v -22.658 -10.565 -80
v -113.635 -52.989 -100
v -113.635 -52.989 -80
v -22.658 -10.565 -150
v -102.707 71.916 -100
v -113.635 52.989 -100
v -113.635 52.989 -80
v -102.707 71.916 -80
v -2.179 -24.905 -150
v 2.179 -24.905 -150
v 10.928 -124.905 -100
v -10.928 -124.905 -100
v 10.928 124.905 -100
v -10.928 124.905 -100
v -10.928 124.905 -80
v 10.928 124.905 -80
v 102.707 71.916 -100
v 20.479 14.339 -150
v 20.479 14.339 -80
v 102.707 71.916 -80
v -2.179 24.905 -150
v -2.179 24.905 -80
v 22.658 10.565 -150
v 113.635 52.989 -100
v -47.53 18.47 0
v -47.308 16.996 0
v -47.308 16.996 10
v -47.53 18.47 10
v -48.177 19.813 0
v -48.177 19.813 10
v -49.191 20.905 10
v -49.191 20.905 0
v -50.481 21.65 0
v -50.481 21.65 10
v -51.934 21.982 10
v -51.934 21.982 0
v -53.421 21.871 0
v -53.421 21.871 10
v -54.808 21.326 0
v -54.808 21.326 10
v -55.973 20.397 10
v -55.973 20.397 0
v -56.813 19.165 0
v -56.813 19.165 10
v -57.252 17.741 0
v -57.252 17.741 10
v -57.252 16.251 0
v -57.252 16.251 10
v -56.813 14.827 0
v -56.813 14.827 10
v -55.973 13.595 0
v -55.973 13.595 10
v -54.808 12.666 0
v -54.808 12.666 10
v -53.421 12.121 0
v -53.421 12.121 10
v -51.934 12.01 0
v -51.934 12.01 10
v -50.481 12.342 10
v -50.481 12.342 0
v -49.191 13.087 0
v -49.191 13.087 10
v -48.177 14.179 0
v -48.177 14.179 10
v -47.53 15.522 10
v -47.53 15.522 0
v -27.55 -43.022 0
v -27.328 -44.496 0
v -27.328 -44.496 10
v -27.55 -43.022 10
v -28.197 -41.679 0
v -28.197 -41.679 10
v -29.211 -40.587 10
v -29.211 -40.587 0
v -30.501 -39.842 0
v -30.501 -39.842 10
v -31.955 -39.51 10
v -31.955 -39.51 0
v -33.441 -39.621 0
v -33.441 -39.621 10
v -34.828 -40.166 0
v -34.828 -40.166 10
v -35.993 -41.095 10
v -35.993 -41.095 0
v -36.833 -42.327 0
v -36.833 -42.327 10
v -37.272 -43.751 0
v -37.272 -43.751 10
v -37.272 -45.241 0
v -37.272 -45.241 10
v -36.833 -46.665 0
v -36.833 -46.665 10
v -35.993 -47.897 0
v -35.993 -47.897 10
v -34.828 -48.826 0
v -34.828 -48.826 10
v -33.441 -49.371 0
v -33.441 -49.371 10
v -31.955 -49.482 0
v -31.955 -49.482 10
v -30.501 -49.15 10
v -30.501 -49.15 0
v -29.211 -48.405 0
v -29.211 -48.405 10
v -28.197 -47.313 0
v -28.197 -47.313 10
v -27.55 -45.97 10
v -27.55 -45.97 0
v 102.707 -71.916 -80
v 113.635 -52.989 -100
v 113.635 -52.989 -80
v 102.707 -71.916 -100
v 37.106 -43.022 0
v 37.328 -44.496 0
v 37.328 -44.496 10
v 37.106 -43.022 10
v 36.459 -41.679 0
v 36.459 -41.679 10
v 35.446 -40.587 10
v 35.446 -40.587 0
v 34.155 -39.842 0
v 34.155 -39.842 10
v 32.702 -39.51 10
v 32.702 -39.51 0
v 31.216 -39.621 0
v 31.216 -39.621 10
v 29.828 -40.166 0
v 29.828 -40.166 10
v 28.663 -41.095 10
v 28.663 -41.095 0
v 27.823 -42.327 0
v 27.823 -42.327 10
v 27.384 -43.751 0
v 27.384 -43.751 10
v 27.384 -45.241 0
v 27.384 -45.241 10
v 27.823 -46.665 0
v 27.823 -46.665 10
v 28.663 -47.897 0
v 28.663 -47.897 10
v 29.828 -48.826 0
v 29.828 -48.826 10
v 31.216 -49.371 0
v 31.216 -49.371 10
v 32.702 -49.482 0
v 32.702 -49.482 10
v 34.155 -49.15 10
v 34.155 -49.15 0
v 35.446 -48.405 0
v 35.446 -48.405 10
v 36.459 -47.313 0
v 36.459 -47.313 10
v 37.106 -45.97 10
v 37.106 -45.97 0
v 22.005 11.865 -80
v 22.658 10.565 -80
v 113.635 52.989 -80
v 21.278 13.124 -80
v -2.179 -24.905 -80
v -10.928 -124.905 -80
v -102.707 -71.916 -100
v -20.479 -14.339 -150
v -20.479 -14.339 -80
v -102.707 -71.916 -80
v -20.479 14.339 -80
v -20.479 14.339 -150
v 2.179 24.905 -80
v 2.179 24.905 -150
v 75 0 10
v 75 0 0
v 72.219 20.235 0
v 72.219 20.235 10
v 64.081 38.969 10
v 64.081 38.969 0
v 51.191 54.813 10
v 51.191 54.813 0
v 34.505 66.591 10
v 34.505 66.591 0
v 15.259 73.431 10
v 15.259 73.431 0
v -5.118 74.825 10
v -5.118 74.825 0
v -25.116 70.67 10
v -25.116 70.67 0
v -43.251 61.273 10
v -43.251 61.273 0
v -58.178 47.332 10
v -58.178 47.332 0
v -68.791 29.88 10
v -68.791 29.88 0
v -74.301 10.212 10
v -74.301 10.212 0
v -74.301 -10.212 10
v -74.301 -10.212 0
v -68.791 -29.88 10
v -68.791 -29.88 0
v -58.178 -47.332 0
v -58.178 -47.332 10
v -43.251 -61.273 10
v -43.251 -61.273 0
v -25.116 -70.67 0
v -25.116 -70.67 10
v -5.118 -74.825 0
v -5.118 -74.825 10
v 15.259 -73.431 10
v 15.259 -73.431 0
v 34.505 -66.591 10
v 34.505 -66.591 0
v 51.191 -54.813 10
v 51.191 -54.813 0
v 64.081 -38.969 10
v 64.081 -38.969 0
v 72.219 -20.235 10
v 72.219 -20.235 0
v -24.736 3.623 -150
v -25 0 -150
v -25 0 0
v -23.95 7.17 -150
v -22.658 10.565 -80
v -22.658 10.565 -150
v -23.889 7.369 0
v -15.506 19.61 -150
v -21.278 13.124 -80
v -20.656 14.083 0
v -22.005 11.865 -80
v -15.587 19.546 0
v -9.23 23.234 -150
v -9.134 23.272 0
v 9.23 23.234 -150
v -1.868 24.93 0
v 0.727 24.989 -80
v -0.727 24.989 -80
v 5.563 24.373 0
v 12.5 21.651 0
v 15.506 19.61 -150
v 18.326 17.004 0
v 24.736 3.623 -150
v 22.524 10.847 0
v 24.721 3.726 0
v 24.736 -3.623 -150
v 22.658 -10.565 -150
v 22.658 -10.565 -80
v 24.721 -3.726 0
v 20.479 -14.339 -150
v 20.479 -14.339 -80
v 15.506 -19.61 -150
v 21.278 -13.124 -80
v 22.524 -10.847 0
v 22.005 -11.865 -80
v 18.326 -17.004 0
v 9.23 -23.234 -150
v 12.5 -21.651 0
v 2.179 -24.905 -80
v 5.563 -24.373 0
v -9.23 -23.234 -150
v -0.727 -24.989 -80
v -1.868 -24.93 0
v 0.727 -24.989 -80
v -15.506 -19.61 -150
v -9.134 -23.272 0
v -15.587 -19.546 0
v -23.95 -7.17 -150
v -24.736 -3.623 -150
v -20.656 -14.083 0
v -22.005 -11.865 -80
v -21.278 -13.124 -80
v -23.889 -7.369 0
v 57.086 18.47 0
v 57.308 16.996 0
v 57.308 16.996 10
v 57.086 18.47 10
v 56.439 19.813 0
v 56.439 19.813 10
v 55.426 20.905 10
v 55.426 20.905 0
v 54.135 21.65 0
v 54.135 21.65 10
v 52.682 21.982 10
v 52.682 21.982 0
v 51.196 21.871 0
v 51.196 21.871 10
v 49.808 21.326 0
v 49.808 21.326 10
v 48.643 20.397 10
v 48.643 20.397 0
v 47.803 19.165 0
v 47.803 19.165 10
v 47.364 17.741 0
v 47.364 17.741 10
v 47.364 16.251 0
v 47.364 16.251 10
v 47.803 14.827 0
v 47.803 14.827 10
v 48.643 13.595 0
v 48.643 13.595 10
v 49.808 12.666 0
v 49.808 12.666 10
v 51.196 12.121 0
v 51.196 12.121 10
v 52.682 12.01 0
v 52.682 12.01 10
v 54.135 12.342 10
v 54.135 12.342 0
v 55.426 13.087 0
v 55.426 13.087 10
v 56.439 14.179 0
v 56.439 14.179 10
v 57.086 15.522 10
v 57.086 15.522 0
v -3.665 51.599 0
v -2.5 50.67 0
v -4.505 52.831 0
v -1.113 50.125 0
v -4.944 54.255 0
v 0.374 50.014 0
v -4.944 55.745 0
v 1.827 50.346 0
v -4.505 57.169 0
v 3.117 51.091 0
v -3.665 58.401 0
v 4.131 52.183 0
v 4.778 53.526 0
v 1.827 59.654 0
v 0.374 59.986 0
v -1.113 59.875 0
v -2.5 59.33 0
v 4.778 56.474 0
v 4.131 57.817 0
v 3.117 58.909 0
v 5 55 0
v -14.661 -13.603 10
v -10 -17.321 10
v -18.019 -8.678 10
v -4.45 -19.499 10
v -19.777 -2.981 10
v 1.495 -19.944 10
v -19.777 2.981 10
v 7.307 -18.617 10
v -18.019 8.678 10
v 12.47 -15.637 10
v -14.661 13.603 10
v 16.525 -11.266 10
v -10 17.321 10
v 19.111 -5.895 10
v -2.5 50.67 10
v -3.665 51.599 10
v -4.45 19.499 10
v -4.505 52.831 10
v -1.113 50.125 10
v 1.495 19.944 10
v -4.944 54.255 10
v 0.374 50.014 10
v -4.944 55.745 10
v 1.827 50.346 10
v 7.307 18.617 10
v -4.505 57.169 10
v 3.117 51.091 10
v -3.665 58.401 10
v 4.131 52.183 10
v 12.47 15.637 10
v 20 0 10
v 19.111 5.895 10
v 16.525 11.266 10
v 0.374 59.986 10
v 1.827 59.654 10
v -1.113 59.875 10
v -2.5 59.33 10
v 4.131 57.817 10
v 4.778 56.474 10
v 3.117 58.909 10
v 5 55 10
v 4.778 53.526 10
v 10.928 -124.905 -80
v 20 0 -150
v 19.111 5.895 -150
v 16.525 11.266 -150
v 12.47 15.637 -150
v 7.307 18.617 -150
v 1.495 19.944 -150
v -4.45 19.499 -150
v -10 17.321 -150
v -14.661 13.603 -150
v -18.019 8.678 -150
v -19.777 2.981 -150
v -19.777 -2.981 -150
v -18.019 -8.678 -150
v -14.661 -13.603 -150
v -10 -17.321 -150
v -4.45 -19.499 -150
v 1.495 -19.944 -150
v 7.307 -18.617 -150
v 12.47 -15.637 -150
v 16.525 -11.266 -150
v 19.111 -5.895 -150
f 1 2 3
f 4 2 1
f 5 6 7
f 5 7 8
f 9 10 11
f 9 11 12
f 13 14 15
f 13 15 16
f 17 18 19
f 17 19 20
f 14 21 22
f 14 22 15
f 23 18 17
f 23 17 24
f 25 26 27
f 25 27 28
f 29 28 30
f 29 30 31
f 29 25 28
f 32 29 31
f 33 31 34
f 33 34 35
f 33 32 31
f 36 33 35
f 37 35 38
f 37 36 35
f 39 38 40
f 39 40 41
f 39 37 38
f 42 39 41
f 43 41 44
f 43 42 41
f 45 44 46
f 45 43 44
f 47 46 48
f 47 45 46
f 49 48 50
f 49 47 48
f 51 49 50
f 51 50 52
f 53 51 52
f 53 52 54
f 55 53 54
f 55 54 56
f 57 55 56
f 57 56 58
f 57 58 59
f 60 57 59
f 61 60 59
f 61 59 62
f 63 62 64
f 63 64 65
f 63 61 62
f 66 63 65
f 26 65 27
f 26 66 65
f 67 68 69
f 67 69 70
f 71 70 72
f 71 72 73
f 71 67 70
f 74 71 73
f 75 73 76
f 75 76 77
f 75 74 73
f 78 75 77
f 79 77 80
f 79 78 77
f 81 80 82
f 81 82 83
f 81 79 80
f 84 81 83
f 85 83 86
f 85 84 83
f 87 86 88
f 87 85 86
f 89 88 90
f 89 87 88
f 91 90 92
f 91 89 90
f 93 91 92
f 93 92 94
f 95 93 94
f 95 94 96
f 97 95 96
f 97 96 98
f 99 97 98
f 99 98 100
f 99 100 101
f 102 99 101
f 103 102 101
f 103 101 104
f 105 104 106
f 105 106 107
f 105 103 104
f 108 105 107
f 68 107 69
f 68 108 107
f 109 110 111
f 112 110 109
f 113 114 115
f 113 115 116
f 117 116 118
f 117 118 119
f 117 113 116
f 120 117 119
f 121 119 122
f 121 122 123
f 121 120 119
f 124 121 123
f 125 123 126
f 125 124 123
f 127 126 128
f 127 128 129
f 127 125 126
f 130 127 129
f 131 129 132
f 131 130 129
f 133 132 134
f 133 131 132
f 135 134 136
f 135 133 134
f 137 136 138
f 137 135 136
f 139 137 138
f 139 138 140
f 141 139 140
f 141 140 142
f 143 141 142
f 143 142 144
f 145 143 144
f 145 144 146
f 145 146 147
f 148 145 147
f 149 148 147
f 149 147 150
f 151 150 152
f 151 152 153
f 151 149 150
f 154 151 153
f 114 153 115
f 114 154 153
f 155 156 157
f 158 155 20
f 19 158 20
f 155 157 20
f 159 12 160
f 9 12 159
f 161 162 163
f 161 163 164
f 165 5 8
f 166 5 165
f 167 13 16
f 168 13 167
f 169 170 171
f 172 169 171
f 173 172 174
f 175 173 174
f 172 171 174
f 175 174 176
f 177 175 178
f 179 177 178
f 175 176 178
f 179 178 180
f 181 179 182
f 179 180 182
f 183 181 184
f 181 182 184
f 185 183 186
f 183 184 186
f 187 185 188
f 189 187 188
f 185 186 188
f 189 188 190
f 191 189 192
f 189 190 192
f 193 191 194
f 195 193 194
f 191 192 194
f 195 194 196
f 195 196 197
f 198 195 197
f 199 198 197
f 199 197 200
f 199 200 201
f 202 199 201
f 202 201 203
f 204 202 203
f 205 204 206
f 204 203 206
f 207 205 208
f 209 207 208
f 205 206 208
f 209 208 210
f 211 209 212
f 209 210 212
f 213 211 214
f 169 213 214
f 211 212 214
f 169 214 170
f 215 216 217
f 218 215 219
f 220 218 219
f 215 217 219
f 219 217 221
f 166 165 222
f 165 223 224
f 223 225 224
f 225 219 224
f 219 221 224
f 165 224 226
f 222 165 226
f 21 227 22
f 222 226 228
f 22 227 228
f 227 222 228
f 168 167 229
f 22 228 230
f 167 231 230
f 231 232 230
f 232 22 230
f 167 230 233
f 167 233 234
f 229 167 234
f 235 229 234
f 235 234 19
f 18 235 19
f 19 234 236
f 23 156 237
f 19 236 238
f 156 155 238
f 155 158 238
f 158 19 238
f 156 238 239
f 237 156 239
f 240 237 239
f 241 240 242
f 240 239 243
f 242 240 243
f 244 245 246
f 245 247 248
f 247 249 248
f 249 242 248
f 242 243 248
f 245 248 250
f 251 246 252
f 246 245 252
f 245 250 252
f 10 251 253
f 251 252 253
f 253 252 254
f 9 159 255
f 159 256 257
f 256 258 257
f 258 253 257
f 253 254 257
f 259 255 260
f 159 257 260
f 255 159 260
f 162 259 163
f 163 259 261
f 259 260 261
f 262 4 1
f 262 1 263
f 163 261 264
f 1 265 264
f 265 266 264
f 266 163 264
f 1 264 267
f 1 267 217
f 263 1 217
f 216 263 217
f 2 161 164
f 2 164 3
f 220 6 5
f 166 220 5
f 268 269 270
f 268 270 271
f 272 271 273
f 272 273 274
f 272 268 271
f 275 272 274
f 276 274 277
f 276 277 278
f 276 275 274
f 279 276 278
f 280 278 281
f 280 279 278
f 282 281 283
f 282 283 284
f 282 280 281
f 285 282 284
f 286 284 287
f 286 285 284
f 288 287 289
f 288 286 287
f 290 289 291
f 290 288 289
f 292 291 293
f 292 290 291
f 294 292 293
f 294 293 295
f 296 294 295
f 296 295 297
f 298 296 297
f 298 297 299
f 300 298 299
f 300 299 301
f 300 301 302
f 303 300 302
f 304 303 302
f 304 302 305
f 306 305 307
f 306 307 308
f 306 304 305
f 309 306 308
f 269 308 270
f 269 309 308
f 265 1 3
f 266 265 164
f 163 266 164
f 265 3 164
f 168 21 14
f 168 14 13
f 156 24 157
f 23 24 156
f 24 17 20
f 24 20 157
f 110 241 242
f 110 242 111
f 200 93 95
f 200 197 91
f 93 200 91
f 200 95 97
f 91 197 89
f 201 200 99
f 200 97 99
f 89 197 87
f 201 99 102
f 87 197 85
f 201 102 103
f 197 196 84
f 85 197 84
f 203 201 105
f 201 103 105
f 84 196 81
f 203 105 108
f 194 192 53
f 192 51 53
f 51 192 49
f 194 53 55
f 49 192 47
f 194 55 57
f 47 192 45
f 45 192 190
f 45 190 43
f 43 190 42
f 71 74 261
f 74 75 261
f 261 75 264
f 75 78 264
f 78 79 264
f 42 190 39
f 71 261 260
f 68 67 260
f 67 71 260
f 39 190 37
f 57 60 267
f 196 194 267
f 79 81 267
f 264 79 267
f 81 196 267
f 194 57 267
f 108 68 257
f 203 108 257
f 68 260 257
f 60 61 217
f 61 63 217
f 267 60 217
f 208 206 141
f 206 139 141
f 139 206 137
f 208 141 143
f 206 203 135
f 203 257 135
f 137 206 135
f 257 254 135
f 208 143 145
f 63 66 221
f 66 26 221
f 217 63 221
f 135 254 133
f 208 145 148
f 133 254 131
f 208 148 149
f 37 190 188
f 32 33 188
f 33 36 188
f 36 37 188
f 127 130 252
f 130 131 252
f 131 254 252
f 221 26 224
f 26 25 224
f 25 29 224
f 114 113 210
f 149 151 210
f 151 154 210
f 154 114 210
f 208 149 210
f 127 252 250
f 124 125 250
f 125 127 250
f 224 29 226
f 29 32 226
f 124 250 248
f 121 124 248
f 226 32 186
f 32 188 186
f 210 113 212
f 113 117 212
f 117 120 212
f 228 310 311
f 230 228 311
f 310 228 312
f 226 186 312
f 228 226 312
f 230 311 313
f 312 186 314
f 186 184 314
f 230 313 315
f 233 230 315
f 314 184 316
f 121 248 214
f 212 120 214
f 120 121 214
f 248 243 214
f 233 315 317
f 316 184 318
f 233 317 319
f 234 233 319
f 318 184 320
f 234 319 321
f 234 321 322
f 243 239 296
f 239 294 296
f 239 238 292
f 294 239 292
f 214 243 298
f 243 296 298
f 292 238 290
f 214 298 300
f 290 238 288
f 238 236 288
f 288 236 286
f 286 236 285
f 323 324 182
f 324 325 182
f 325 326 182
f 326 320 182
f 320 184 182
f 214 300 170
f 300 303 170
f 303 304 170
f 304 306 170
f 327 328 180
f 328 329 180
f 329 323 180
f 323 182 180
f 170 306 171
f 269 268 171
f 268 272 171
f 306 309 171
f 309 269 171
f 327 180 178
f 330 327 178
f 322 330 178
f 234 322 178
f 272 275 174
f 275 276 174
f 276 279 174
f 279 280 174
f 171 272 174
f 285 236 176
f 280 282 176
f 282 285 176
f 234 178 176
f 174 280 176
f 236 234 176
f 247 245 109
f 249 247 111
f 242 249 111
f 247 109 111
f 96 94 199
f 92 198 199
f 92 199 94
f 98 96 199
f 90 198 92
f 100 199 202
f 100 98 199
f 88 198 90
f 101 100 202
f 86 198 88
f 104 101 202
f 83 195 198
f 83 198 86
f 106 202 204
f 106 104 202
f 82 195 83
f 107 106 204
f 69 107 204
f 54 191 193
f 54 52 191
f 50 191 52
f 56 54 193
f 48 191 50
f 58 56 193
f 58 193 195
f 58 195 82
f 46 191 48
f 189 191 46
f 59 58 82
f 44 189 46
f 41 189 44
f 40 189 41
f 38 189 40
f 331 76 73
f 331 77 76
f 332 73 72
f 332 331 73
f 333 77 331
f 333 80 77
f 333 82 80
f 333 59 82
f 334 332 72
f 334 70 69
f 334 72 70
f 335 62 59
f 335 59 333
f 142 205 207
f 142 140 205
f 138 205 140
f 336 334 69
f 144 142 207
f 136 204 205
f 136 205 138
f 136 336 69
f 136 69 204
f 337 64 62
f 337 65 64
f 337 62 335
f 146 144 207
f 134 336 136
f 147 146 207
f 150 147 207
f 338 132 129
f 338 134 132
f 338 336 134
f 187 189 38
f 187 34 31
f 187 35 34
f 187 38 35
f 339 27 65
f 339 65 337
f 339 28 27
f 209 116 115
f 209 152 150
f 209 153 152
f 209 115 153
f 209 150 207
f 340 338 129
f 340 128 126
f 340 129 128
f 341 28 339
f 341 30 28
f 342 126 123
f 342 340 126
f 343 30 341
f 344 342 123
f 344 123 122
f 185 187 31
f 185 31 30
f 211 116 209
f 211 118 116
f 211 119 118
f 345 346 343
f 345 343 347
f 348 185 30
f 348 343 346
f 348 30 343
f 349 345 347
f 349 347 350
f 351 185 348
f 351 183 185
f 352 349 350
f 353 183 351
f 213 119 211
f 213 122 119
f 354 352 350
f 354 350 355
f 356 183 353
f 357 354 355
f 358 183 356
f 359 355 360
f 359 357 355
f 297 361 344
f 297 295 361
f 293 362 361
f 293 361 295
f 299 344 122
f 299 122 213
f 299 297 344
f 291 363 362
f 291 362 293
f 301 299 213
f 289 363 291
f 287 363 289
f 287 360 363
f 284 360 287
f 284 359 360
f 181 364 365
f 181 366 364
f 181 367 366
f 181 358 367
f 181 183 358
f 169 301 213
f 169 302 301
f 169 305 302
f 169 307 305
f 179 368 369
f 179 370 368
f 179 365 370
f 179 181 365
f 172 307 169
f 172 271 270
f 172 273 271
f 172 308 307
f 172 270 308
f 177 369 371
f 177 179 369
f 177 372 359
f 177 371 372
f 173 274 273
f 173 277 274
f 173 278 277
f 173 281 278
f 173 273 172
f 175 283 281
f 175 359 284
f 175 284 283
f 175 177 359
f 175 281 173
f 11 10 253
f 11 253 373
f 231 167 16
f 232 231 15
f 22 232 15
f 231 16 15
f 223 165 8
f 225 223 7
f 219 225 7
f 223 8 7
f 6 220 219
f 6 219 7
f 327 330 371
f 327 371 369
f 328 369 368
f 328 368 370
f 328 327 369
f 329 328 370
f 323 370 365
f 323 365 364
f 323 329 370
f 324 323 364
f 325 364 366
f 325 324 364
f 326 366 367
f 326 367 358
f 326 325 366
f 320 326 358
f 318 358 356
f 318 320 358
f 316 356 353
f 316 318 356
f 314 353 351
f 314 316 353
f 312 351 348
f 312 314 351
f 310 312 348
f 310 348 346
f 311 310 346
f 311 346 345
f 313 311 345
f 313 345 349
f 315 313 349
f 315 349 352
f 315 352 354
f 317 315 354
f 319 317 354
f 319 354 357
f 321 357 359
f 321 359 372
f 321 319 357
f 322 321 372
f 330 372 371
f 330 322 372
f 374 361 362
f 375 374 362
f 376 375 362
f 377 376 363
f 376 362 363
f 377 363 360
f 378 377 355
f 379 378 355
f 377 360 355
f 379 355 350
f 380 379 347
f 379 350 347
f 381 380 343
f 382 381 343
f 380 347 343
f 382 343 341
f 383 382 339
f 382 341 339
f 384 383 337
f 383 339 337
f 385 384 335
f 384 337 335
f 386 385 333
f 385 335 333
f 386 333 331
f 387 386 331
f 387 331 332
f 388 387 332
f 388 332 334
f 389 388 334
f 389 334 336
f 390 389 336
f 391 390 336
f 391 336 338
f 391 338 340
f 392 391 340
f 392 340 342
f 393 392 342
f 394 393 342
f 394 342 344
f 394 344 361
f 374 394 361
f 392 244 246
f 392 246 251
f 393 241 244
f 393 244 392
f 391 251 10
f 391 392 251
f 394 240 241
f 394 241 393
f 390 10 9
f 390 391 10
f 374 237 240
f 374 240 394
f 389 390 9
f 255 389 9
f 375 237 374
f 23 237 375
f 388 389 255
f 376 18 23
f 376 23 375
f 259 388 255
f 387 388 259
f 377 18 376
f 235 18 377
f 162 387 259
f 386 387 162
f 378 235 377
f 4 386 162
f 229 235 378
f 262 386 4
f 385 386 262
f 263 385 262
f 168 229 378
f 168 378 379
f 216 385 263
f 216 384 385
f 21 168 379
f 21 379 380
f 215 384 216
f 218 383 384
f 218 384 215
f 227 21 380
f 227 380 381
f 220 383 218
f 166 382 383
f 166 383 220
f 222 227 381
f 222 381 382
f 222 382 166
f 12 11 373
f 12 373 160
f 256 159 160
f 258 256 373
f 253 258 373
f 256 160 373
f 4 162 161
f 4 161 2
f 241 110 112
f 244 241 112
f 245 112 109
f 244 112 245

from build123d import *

# Parameters (mm, degrees)
SKETCH1_R                     = 75
SKETCH1_R_2                   = 5
BOSS_EXTRUDE1_DEPTH           = 10
SKETCH2_R                     = 25
BOSS_EXTRUDE2_DEPTH           = 150
BOSS_EXTRUDE3_DEPTH           = 70
CHAMFER2_SIZE                 = 100
CHAMFER2_SIZE2                = 50
CIRPATTERN3_COUNT             = 6
CHAMFER2_OF_CIRPATTERN3_SIZE2 = 50
CHAMFER2_OF_CIRPATTERN3_SIZE  = 100
SKETCH4_R                     = 20
CUT_EXTRUDE1_DEPTH            = 1
CUT_EXTRUDE1_DEPTH_BACK       = 161


with BuildPart() as part:
    # Sketch1 → Boss-Extrude1 (new body)
    with BuildSketch(Plane.XY):
        Circle(SKETCH1_R)
        with Locations((0, 55)):
            Circle(SKETCH1_R_2, mode=Mode.SUBTRACT)
        with Locations((52.308108396, 16.995934691)):
            Circle(SKETCH1_R_2, mode=Mode.SUBTRACT)
        with Locations((32.328188876, -44.495934691)):
            Circle(SKETCH1_R_2, mode=Mode.SUBTRACT)
        with Locations((-32.328188876, -44.495934691)):
            Circle(SKETCH1_R_2, mode=Mode.SUBTRACT)
        with Locations((-52.308108396, 16.995934691)):
            Circle(SKETCH1_R_2, mode=Mode.SUBTRACT)
    extrude(amount=BOSS_EXTRUDE1_DEPTH)

    # Sketch2 → Boss-Extrude2 (add)
    with BuildSketch(Plane(origin=(0, 0, 0), x_dir=(-1, 0, 0), z_dir=(0, 0, -1))):
        Circle(SKETCH2_R)
    extrude(amount=BOSS_EXTRUDE2_DEPTH)

    # Sketch3 → Boss-Extrude3 (add)
    with BuildSketch(Plane(origin=(0, 0, -150), x_dir=(-1, 0, 0), z_dir=(0, 0, -1))):
        with BuildLine():
            ThreePointArc((-2.178893569, 24.904867452), (0, 25), (2.178893569, 24.904867452))
            Line((2.178893569, 24.904867452), (10.927759921, 124.904867452))
            Line((10.927759921, 124.904867452), (-10.927759921, 124.904867452))
            Line((-10.927759921, 124.904867452), (-2.178893569, 24.904867452))
        make_face()
    boss_extrude3 = extrude(amount=-BOSS_EXTRUDE3_DEPTH)

    # Chamfer2
    chamfer2_edges = [part.edges().sort_by_distance(p)[0] for p in [
        (0, 124.904867452, -150),
    ]]
    chamfer2_side = [part.faces().sort_by_distance(p)[0] for p in [
        (0, 34.439140916, -150),
    ]]
    chamfer(chamfer2_edges, length=CHAMFER2_SIZE, length2=CHAMFER2_SIZE2, reference=chamfer2_side[0])

    # CirPattern3: Boss-Extrude3 ×6 about axis
    cirpattern3_axis = Axis((0, 0, 0), (0, 0, 1))
    for i in range(1, CIRPATTERN3_COUNT):
        add(boss_extrude3.rotate(cirpattern3_axis, i * 360 / CIRPATTERN3_COUNT))

    # Chamfer2 of CirPattern3
    chamfer2_of_cirpattern3_edges = [part.edges().sort_by_distance(p)[0] for p in [
        (-108.17078827, 62.452433726, -150),
        (-108.17078827, -62.452433726, -150),
        (0, -124.904867452, -150),
        (108.17078827, -62.452433726, -150),
        (108.17078827, 62.452433726, -150),
    ]]
    chamfer(chamfer2_of_cirpattern3_edges, length=CHAMFER2_OF_CIRPATTERN3_SIZE, length2=CHAMFER2_OF_CIRPATTERN3_SIZE2)

    # Sketch4 → Cut-Extrude1 (cut, two sides)
    with BuildSketch(Plane.XY.offset(10)) as cut_extrude1_sk:
        Circle(SKETCH4_R)
    extrude(amount=CUT_EXTRUDE1_DEPTH, mode=Mode.SUBTRACT)
    extrude(cut_extrude1_sk.sketch, amount=-CUT_EXTRUDE1_DEPTH_BACK, mode=Mode.SUBTRACT)


solid = part.part
